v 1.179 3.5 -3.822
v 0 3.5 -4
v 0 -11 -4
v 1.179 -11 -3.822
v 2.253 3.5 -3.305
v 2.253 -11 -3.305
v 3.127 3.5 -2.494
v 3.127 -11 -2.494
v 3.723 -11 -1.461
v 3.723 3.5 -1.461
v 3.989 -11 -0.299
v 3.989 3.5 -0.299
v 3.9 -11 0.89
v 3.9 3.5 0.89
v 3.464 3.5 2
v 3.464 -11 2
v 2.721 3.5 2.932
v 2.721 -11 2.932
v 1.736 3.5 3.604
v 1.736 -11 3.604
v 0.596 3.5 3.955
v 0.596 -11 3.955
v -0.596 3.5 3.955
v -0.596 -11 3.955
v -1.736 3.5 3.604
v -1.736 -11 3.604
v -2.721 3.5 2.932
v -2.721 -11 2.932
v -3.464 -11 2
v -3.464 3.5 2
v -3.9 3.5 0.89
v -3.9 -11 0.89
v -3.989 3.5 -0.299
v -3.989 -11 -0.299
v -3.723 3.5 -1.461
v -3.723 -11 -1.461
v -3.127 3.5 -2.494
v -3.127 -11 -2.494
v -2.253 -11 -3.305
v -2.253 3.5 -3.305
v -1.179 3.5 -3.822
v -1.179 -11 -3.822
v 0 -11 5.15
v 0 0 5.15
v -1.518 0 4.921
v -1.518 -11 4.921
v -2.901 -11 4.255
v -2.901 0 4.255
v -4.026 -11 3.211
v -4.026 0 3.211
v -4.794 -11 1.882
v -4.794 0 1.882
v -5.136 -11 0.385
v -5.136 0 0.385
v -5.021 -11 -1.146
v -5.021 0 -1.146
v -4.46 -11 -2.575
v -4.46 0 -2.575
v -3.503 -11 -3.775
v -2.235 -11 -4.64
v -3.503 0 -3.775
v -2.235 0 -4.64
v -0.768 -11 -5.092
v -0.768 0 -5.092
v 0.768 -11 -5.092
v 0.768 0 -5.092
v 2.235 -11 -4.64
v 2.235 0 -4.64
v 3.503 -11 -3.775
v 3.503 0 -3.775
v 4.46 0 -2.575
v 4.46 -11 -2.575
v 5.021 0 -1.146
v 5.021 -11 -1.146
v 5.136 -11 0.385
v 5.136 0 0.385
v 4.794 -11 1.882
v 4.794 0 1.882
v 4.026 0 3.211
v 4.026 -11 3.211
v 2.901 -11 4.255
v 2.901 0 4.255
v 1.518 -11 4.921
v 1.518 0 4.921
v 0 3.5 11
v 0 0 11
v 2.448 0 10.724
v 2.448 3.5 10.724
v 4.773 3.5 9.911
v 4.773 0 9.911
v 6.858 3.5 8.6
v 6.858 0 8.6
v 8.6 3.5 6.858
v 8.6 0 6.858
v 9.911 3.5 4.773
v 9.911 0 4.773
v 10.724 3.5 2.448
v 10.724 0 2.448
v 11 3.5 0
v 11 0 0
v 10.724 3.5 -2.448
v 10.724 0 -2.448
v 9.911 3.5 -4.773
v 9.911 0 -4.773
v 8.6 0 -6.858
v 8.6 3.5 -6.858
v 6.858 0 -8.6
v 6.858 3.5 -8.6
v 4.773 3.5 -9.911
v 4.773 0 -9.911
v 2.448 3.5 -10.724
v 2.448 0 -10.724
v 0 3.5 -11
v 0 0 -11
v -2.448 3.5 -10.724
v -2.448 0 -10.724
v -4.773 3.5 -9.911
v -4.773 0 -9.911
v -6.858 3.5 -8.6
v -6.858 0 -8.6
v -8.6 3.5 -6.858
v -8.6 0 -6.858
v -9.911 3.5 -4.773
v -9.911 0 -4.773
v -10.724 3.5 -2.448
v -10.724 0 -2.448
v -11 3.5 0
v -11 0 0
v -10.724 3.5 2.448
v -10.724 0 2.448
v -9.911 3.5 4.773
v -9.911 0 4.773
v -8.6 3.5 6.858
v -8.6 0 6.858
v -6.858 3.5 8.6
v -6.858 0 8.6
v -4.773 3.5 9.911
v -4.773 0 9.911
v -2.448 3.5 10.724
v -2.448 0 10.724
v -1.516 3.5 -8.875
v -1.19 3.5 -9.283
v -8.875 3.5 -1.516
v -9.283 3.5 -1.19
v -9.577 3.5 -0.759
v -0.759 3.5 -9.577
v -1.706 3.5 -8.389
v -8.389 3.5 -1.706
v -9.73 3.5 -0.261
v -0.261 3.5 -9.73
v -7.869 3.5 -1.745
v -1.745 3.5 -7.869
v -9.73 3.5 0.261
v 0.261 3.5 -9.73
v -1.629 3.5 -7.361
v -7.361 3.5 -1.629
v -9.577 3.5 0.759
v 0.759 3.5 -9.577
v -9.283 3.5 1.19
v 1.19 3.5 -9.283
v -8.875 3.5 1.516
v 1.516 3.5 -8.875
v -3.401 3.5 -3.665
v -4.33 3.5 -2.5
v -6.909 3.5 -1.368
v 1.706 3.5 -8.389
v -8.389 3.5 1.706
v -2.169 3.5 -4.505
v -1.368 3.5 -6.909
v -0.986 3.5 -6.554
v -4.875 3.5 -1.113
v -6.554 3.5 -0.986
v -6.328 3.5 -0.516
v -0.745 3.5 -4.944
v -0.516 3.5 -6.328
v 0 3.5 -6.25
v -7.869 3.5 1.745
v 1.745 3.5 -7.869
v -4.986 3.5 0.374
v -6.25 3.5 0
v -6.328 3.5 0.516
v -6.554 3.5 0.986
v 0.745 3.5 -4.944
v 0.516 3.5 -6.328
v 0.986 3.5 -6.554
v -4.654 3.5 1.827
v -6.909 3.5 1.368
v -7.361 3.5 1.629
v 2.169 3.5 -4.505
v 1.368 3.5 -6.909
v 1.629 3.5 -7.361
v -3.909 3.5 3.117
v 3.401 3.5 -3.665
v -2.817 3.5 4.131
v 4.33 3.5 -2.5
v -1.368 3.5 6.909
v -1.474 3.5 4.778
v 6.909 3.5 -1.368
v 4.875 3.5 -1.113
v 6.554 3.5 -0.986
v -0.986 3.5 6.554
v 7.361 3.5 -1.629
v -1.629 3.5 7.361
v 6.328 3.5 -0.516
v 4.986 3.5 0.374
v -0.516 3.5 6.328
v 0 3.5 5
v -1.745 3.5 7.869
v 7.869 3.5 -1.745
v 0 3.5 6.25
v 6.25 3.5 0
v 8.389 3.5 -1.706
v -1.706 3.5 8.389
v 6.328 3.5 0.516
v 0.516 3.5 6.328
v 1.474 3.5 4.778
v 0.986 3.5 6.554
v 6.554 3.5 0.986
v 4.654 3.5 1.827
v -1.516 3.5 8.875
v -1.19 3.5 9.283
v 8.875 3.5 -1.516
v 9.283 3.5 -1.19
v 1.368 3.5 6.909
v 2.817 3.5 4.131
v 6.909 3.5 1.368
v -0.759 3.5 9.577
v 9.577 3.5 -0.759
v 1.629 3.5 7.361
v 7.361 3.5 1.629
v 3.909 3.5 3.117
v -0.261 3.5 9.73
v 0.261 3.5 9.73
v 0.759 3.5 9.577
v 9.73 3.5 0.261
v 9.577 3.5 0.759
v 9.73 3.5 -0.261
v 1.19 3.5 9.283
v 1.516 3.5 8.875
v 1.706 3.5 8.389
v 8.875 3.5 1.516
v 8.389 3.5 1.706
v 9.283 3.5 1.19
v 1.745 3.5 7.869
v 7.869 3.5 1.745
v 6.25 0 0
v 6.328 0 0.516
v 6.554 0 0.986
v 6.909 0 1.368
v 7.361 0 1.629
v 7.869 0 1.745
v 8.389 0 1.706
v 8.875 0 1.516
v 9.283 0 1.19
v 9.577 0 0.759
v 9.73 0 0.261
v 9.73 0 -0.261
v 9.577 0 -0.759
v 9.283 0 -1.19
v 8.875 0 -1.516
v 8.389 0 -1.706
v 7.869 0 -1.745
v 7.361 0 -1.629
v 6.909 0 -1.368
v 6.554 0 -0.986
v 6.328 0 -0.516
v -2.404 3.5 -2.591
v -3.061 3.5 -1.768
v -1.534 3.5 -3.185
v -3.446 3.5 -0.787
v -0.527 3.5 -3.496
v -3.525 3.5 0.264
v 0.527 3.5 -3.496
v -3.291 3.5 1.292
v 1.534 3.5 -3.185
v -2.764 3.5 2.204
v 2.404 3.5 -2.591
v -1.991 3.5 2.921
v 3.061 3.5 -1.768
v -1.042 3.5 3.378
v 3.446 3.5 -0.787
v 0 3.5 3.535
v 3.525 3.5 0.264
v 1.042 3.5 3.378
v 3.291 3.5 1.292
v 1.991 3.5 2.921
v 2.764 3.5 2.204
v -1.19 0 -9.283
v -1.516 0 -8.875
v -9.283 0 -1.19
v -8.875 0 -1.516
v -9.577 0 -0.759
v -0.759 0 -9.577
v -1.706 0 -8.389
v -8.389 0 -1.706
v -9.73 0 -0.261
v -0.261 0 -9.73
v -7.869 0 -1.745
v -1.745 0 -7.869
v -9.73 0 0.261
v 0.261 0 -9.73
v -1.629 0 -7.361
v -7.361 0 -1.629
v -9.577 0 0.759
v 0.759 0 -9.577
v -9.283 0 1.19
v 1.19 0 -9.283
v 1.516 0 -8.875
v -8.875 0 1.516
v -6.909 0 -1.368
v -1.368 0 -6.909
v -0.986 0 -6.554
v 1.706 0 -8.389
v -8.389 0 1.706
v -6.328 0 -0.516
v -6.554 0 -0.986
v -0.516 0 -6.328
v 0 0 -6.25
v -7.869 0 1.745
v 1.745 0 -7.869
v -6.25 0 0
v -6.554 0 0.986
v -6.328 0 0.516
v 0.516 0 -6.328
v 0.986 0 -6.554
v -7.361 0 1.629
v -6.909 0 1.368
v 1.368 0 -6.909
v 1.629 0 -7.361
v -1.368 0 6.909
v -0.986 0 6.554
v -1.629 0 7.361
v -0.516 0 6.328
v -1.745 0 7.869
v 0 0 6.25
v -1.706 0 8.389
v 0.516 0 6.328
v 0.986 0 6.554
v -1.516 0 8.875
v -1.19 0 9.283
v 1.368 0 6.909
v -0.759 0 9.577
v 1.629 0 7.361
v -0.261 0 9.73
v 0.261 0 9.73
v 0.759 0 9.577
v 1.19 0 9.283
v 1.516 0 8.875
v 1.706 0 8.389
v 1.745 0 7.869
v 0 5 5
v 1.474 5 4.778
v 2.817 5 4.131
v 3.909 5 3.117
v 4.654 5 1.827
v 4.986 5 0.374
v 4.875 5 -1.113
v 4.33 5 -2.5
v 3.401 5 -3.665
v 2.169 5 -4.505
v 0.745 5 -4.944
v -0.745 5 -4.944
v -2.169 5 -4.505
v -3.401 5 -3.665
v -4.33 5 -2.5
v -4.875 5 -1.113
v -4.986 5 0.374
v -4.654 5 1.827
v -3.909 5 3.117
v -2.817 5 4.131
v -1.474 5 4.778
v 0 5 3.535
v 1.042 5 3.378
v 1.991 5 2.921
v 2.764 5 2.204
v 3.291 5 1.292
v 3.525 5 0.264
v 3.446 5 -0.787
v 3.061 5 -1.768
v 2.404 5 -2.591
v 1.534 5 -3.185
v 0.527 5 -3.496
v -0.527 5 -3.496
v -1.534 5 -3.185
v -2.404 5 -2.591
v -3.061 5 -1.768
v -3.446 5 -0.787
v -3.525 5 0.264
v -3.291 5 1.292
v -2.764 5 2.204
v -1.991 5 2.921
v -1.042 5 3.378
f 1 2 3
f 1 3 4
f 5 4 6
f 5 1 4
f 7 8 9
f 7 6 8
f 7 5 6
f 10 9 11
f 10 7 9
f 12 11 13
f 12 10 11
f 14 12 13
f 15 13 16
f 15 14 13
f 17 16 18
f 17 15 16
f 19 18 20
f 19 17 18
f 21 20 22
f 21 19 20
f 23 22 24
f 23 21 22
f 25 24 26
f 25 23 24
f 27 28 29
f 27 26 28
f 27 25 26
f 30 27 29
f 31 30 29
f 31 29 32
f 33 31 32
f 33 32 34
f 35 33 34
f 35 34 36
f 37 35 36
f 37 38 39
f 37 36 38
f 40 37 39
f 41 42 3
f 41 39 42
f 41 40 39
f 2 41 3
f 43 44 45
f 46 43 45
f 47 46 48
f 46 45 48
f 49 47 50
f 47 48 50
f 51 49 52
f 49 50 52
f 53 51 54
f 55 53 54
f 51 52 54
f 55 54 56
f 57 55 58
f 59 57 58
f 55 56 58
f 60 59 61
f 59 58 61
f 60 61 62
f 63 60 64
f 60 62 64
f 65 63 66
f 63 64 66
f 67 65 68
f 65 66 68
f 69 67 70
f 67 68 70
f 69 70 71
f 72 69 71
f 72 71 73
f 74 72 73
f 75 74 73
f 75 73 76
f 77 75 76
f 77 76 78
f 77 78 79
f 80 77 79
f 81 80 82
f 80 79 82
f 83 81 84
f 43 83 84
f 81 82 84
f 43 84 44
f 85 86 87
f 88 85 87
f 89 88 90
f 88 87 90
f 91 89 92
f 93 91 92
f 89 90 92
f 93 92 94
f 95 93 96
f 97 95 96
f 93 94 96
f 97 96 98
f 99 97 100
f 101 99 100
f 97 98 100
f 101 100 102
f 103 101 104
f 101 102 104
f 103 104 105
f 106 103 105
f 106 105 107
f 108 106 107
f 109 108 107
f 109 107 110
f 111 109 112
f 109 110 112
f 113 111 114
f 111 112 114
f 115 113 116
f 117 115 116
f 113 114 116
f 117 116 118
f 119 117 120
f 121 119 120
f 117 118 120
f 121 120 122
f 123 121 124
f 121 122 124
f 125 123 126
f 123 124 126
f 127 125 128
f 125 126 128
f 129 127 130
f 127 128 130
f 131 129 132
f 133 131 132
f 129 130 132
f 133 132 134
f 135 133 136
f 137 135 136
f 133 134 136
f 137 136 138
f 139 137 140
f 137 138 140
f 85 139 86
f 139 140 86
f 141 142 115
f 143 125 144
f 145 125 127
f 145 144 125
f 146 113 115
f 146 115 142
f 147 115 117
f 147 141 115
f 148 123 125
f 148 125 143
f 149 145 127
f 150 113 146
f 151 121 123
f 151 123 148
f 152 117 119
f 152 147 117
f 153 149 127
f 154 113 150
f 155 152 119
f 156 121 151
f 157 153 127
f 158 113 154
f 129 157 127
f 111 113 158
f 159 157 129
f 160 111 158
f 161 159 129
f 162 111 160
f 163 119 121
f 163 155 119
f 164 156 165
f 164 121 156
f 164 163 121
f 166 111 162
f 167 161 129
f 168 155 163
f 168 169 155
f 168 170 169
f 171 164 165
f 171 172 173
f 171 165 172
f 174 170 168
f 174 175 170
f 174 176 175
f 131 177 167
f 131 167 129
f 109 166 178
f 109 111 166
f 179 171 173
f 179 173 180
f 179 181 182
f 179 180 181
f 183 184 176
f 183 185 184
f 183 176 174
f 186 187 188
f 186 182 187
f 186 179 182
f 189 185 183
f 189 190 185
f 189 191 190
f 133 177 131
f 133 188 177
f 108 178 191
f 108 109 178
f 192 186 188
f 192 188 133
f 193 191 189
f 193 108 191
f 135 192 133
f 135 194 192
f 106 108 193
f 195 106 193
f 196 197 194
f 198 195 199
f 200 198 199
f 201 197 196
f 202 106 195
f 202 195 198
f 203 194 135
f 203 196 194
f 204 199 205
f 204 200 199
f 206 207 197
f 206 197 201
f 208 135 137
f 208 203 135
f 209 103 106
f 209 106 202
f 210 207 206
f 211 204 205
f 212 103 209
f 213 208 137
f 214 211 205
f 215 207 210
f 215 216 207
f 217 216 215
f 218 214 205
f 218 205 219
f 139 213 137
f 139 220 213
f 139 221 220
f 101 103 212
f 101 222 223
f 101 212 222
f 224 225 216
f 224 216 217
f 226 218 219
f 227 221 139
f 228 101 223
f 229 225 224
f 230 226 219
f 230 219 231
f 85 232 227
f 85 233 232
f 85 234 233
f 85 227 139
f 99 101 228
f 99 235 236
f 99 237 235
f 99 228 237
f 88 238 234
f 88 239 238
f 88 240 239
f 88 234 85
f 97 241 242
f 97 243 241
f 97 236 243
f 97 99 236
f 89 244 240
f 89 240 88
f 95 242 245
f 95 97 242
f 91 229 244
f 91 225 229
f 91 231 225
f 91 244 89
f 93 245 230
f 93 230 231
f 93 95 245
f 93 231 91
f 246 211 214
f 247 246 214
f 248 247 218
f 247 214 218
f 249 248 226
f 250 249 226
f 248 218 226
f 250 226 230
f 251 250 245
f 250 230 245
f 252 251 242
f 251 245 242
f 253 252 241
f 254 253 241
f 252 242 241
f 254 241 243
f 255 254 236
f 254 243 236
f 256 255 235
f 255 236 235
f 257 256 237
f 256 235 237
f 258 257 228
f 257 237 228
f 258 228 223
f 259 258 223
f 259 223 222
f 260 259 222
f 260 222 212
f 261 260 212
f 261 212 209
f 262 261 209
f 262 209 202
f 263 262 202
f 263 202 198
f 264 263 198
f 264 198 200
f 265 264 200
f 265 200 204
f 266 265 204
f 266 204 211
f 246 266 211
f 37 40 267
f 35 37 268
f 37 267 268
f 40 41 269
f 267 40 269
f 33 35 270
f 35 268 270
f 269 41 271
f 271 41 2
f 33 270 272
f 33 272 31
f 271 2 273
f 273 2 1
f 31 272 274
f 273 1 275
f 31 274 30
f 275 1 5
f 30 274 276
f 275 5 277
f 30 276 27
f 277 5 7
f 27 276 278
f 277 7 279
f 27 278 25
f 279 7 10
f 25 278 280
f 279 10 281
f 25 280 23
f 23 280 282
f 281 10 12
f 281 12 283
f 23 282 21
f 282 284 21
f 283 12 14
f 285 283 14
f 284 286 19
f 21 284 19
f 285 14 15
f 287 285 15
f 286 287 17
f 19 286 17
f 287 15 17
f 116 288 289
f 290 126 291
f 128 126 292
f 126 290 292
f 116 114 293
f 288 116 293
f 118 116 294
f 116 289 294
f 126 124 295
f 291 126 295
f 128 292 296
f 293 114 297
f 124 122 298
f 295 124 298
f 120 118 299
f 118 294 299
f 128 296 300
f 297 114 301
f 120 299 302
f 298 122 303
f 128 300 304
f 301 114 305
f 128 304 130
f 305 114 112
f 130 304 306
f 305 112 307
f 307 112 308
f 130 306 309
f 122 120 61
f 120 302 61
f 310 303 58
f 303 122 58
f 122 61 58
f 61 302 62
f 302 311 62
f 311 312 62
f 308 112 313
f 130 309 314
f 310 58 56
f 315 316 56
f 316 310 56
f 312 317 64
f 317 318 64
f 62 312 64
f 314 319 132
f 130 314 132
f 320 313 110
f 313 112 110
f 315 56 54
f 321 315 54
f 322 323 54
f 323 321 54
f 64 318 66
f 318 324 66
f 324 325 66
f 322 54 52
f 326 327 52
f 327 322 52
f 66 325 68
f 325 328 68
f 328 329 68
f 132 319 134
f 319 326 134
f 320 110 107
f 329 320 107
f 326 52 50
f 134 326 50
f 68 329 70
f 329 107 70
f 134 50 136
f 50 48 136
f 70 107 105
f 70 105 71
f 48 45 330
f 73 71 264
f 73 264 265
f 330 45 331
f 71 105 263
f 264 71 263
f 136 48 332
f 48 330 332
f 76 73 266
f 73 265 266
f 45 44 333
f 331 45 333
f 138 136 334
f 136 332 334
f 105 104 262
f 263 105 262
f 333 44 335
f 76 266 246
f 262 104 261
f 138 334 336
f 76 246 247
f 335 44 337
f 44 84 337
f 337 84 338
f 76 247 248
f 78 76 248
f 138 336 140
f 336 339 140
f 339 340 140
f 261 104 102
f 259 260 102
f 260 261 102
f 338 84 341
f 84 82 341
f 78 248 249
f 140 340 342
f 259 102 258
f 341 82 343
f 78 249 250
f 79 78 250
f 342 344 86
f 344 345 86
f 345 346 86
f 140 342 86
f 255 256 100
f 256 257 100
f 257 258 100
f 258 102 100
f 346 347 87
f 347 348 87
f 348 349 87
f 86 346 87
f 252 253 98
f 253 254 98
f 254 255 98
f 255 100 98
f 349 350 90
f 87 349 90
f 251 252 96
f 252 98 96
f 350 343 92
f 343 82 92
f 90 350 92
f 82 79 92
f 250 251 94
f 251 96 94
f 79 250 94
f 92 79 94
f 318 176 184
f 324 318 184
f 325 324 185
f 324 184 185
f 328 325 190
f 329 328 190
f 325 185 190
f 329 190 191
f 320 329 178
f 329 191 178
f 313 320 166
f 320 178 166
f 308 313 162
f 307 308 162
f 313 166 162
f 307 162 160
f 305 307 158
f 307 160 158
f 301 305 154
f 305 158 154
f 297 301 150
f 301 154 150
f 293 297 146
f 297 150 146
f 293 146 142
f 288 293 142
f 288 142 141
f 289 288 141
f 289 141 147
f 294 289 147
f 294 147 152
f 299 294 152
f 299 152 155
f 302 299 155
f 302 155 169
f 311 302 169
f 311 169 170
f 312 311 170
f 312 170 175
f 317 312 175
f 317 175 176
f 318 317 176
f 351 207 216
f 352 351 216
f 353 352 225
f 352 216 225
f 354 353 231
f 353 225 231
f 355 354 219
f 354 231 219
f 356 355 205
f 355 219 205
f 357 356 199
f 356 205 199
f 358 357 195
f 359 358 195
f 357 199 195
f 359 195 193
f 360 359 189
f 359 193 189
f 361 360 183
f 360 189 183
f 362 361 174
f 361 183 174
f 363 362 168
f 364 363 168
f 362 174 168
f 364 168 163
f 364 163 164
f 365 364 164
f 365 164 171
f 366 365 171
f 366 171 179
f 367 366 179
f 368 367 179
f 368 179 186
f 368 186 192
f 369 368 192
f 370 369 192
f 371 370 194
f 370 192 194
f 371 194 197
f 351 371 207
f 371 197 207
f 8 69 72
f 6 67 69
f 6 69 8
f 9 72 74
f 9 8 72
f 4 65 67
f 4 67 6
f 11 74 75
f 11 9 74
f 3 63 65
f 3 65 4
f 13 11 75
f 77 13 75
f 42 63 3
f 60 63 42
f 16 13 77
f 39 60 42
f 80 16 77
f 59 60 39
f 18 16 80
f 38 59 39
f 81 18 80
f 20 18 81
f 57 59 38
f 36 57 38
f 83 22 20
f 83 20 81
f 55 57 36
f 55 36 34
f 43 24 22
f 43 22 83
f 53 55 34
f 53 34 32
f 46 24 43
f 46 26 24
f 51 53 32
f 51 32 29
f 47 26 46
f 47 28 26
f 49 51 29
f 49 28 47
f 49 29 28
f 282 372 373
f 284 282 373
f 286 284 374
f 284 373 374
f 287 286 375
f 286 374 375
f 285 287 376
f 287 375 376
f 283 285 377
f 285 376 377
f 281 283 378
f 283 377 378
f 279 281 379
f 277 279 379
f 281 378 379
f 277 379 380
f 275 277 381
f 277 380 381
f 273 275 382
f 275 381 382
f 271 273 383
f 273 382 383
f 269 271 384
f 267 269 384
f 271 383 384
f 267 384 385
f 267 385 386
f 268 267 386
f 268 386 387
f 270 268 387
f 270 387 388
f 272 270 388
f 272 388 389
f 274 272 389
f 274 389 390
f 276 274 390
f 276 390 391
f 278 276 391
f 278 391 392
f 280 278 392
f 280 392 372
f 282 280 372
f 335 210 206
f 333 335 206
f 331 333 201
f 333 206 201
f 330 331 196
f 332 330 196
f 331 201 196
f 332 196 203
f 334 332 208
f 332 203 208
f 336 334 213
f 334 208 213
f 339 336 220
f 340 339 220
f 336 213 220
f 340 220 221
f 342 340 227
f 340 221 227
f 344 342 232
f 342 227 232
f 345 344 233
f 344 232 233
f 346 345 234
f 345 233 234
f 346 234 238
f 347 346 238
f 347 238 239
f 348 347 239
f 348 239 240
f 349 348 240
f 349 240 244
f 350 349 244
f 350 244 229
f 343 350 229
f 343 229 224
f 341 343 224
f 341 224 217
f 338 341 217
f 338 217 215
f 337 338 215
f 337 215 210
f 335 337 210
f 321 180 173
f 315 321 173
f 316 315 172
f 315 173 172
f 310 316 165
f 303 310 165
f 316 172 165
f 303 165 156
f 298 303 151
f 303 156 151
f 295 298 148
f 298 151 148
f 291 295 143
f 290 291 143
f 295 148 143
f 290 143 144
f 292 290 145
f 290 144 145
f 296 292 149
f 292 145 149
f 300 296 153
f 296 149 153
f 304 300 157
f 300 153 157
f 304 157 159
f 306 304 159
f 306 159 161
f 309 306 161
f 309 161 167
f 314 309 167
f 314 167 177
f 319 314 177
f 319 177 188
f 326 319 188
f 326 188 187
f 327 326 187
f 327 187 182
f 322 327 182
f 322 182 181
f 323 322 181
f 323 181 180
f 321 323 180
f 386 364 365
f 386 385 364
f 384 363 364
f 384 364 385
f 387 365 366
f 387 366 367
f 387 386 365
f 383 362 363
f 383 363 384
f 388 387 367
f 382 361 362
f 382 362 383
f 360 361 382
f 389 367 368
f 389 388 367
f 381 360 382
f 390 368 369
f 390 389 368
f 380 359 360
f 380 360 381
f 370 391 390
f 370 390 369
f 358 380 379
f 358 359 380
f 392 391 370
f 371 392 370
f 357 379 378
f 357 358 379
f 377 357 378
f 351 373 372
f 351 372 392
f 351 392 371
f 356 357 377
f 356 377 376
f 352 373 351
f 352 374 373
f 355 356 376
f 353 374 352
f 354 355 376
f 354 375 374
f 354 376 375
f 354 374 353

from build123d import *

# Parameters (mm, degrees)
SKETCH_1_R               = 11
EXTRUDE_2_DEPTH          = 3.5
SKETCH_2_R               = 5.15
EXTRUDE_3_DEPTH          = 11
CUT_EXTRUDE_1_DEPTH      = 22.266170318
CUT_EXTRUDE_1_DEPTH_BACK = 22.266170318
SKETCH_3_R               = 4
CUT_EXTRUDE_4_REACH      = 23.266
SKETCH_4_R               = 1.75
PATTERN_CIRCULAR_6_COUNT = 4
SKETCH_7_R               = 5
EXTRUDE_4_DEPTH          = 1.5
SKETCH_8_R               = 3.535076685
CUT_EXTRUDE_5_DEPTH      = 23.315913604


with BuildPart() as part:
    # 草图1 → 凸台-拉伸2 (new body)
    with BuildSketch(Plane(origin=(0, 0, 0), x_dir=(1, 0, 0), z_dir=(0, 1, 0))):
        with Locations(Location((0, 0, 0), (0, 0, 270))):
            Circle(SKETCH_1_R)
    extrude(amount=EXTRUDE_2_DEPTH)

    # 草图2 → 凸台-拉伸3 (add)
    with BuildSketch(Plane.XZ):
        with Locations(Location((0, 0, 0), (0, 0, 90))):
            Circle(SKETCH_2_R)
    extrude(amount=EXTRUDE_3_DEPTH)

    # 草图3 → 切除-拉伸1 (cut, two sides: drawn at the far end of the back side and taken through both)
    with BuildSketch(Plane.XZ.offset(11).offset(-CUT_EXTRUDE_1_DEPTH_BACK)):
        with Locations(Location((0, 0, 0), (0, 0, 270))):
            Circle(SKETCH_3_R)
    extrude(amount=CUT_EXTRUDE_1_DEPTH + CUT_EXTRUDE_1_DEPTH_BACK, mode=Mode.SUBTRACT)

    # 草图4 → 切除-拉伸4 (cut, up to next)
    with BuildSketch(Plane(origin=(0, 3.5, 0), x_dir=(1, 0, 0), z_dir=(0, 1, 0)), mode=Mode.PRIVATE) as cut_extrude_4_sk1:
        with Locations(Location((0, 8, 0), (0, 0, 270))):
            Circle(SKETCH_4_R)
    cut_extrude_4_tool1 = extrude(cut_extrude_4_sk1.sketch, amount=-CUT_EXTRUDE_4_REACH, mode=Mode.PRIVATE) & part.part
    cut_extrude_4 = cut_extrude_4_tool1.solids().sort_by_distance((0, 3.5, -8))[0]
    add(cut_extrude_4, mode=Mode.SUBTRACT)

    # 阵列(圆周)6: 切除-拉伸4 ×4 about axis
    pattern_circular_6_axis = Axis((0, 0, 0), (0, 1, 0))
    for i in range(1, PATTERN_CIRCULAR_6_COUNT):
        add(cut_extrude_4.rotate(pattern_circular_6_axis, i * 360 / PATTERN_CIRCULAR_6_COUNT), mode=Mode.SUBTRACT)

    # 草图7 → 凸台-拉伸4 (add)
    with BuildSketch(Plane(origin=(0, 3.5, 0), x_dir=(1, 0, 0), z_dir=(0, 1, 0))):
        with Locations(Location((0, 0, 0), (0, 0, 270))):
            Circle(SKETCH_7_R)
    extrude(amount=EXTRUDE_4_DEPTH)

    # 草图8 → 切除-拉伸5 (cut, through all)
    with BuildSketch(Plane(origin=(0, 5, 0), x_dir=(1, 0, 0), z_dir=(0, 1, 0))):
        with Locations(Location((0, 0, 0), (0, 0, 270))):
            Circle(SKETCH_8_R)
    extrude(amount=-CUT_EXTRUDE_5_DEPTH, mode=Mode.SUBTRACT)


solid = part.part
